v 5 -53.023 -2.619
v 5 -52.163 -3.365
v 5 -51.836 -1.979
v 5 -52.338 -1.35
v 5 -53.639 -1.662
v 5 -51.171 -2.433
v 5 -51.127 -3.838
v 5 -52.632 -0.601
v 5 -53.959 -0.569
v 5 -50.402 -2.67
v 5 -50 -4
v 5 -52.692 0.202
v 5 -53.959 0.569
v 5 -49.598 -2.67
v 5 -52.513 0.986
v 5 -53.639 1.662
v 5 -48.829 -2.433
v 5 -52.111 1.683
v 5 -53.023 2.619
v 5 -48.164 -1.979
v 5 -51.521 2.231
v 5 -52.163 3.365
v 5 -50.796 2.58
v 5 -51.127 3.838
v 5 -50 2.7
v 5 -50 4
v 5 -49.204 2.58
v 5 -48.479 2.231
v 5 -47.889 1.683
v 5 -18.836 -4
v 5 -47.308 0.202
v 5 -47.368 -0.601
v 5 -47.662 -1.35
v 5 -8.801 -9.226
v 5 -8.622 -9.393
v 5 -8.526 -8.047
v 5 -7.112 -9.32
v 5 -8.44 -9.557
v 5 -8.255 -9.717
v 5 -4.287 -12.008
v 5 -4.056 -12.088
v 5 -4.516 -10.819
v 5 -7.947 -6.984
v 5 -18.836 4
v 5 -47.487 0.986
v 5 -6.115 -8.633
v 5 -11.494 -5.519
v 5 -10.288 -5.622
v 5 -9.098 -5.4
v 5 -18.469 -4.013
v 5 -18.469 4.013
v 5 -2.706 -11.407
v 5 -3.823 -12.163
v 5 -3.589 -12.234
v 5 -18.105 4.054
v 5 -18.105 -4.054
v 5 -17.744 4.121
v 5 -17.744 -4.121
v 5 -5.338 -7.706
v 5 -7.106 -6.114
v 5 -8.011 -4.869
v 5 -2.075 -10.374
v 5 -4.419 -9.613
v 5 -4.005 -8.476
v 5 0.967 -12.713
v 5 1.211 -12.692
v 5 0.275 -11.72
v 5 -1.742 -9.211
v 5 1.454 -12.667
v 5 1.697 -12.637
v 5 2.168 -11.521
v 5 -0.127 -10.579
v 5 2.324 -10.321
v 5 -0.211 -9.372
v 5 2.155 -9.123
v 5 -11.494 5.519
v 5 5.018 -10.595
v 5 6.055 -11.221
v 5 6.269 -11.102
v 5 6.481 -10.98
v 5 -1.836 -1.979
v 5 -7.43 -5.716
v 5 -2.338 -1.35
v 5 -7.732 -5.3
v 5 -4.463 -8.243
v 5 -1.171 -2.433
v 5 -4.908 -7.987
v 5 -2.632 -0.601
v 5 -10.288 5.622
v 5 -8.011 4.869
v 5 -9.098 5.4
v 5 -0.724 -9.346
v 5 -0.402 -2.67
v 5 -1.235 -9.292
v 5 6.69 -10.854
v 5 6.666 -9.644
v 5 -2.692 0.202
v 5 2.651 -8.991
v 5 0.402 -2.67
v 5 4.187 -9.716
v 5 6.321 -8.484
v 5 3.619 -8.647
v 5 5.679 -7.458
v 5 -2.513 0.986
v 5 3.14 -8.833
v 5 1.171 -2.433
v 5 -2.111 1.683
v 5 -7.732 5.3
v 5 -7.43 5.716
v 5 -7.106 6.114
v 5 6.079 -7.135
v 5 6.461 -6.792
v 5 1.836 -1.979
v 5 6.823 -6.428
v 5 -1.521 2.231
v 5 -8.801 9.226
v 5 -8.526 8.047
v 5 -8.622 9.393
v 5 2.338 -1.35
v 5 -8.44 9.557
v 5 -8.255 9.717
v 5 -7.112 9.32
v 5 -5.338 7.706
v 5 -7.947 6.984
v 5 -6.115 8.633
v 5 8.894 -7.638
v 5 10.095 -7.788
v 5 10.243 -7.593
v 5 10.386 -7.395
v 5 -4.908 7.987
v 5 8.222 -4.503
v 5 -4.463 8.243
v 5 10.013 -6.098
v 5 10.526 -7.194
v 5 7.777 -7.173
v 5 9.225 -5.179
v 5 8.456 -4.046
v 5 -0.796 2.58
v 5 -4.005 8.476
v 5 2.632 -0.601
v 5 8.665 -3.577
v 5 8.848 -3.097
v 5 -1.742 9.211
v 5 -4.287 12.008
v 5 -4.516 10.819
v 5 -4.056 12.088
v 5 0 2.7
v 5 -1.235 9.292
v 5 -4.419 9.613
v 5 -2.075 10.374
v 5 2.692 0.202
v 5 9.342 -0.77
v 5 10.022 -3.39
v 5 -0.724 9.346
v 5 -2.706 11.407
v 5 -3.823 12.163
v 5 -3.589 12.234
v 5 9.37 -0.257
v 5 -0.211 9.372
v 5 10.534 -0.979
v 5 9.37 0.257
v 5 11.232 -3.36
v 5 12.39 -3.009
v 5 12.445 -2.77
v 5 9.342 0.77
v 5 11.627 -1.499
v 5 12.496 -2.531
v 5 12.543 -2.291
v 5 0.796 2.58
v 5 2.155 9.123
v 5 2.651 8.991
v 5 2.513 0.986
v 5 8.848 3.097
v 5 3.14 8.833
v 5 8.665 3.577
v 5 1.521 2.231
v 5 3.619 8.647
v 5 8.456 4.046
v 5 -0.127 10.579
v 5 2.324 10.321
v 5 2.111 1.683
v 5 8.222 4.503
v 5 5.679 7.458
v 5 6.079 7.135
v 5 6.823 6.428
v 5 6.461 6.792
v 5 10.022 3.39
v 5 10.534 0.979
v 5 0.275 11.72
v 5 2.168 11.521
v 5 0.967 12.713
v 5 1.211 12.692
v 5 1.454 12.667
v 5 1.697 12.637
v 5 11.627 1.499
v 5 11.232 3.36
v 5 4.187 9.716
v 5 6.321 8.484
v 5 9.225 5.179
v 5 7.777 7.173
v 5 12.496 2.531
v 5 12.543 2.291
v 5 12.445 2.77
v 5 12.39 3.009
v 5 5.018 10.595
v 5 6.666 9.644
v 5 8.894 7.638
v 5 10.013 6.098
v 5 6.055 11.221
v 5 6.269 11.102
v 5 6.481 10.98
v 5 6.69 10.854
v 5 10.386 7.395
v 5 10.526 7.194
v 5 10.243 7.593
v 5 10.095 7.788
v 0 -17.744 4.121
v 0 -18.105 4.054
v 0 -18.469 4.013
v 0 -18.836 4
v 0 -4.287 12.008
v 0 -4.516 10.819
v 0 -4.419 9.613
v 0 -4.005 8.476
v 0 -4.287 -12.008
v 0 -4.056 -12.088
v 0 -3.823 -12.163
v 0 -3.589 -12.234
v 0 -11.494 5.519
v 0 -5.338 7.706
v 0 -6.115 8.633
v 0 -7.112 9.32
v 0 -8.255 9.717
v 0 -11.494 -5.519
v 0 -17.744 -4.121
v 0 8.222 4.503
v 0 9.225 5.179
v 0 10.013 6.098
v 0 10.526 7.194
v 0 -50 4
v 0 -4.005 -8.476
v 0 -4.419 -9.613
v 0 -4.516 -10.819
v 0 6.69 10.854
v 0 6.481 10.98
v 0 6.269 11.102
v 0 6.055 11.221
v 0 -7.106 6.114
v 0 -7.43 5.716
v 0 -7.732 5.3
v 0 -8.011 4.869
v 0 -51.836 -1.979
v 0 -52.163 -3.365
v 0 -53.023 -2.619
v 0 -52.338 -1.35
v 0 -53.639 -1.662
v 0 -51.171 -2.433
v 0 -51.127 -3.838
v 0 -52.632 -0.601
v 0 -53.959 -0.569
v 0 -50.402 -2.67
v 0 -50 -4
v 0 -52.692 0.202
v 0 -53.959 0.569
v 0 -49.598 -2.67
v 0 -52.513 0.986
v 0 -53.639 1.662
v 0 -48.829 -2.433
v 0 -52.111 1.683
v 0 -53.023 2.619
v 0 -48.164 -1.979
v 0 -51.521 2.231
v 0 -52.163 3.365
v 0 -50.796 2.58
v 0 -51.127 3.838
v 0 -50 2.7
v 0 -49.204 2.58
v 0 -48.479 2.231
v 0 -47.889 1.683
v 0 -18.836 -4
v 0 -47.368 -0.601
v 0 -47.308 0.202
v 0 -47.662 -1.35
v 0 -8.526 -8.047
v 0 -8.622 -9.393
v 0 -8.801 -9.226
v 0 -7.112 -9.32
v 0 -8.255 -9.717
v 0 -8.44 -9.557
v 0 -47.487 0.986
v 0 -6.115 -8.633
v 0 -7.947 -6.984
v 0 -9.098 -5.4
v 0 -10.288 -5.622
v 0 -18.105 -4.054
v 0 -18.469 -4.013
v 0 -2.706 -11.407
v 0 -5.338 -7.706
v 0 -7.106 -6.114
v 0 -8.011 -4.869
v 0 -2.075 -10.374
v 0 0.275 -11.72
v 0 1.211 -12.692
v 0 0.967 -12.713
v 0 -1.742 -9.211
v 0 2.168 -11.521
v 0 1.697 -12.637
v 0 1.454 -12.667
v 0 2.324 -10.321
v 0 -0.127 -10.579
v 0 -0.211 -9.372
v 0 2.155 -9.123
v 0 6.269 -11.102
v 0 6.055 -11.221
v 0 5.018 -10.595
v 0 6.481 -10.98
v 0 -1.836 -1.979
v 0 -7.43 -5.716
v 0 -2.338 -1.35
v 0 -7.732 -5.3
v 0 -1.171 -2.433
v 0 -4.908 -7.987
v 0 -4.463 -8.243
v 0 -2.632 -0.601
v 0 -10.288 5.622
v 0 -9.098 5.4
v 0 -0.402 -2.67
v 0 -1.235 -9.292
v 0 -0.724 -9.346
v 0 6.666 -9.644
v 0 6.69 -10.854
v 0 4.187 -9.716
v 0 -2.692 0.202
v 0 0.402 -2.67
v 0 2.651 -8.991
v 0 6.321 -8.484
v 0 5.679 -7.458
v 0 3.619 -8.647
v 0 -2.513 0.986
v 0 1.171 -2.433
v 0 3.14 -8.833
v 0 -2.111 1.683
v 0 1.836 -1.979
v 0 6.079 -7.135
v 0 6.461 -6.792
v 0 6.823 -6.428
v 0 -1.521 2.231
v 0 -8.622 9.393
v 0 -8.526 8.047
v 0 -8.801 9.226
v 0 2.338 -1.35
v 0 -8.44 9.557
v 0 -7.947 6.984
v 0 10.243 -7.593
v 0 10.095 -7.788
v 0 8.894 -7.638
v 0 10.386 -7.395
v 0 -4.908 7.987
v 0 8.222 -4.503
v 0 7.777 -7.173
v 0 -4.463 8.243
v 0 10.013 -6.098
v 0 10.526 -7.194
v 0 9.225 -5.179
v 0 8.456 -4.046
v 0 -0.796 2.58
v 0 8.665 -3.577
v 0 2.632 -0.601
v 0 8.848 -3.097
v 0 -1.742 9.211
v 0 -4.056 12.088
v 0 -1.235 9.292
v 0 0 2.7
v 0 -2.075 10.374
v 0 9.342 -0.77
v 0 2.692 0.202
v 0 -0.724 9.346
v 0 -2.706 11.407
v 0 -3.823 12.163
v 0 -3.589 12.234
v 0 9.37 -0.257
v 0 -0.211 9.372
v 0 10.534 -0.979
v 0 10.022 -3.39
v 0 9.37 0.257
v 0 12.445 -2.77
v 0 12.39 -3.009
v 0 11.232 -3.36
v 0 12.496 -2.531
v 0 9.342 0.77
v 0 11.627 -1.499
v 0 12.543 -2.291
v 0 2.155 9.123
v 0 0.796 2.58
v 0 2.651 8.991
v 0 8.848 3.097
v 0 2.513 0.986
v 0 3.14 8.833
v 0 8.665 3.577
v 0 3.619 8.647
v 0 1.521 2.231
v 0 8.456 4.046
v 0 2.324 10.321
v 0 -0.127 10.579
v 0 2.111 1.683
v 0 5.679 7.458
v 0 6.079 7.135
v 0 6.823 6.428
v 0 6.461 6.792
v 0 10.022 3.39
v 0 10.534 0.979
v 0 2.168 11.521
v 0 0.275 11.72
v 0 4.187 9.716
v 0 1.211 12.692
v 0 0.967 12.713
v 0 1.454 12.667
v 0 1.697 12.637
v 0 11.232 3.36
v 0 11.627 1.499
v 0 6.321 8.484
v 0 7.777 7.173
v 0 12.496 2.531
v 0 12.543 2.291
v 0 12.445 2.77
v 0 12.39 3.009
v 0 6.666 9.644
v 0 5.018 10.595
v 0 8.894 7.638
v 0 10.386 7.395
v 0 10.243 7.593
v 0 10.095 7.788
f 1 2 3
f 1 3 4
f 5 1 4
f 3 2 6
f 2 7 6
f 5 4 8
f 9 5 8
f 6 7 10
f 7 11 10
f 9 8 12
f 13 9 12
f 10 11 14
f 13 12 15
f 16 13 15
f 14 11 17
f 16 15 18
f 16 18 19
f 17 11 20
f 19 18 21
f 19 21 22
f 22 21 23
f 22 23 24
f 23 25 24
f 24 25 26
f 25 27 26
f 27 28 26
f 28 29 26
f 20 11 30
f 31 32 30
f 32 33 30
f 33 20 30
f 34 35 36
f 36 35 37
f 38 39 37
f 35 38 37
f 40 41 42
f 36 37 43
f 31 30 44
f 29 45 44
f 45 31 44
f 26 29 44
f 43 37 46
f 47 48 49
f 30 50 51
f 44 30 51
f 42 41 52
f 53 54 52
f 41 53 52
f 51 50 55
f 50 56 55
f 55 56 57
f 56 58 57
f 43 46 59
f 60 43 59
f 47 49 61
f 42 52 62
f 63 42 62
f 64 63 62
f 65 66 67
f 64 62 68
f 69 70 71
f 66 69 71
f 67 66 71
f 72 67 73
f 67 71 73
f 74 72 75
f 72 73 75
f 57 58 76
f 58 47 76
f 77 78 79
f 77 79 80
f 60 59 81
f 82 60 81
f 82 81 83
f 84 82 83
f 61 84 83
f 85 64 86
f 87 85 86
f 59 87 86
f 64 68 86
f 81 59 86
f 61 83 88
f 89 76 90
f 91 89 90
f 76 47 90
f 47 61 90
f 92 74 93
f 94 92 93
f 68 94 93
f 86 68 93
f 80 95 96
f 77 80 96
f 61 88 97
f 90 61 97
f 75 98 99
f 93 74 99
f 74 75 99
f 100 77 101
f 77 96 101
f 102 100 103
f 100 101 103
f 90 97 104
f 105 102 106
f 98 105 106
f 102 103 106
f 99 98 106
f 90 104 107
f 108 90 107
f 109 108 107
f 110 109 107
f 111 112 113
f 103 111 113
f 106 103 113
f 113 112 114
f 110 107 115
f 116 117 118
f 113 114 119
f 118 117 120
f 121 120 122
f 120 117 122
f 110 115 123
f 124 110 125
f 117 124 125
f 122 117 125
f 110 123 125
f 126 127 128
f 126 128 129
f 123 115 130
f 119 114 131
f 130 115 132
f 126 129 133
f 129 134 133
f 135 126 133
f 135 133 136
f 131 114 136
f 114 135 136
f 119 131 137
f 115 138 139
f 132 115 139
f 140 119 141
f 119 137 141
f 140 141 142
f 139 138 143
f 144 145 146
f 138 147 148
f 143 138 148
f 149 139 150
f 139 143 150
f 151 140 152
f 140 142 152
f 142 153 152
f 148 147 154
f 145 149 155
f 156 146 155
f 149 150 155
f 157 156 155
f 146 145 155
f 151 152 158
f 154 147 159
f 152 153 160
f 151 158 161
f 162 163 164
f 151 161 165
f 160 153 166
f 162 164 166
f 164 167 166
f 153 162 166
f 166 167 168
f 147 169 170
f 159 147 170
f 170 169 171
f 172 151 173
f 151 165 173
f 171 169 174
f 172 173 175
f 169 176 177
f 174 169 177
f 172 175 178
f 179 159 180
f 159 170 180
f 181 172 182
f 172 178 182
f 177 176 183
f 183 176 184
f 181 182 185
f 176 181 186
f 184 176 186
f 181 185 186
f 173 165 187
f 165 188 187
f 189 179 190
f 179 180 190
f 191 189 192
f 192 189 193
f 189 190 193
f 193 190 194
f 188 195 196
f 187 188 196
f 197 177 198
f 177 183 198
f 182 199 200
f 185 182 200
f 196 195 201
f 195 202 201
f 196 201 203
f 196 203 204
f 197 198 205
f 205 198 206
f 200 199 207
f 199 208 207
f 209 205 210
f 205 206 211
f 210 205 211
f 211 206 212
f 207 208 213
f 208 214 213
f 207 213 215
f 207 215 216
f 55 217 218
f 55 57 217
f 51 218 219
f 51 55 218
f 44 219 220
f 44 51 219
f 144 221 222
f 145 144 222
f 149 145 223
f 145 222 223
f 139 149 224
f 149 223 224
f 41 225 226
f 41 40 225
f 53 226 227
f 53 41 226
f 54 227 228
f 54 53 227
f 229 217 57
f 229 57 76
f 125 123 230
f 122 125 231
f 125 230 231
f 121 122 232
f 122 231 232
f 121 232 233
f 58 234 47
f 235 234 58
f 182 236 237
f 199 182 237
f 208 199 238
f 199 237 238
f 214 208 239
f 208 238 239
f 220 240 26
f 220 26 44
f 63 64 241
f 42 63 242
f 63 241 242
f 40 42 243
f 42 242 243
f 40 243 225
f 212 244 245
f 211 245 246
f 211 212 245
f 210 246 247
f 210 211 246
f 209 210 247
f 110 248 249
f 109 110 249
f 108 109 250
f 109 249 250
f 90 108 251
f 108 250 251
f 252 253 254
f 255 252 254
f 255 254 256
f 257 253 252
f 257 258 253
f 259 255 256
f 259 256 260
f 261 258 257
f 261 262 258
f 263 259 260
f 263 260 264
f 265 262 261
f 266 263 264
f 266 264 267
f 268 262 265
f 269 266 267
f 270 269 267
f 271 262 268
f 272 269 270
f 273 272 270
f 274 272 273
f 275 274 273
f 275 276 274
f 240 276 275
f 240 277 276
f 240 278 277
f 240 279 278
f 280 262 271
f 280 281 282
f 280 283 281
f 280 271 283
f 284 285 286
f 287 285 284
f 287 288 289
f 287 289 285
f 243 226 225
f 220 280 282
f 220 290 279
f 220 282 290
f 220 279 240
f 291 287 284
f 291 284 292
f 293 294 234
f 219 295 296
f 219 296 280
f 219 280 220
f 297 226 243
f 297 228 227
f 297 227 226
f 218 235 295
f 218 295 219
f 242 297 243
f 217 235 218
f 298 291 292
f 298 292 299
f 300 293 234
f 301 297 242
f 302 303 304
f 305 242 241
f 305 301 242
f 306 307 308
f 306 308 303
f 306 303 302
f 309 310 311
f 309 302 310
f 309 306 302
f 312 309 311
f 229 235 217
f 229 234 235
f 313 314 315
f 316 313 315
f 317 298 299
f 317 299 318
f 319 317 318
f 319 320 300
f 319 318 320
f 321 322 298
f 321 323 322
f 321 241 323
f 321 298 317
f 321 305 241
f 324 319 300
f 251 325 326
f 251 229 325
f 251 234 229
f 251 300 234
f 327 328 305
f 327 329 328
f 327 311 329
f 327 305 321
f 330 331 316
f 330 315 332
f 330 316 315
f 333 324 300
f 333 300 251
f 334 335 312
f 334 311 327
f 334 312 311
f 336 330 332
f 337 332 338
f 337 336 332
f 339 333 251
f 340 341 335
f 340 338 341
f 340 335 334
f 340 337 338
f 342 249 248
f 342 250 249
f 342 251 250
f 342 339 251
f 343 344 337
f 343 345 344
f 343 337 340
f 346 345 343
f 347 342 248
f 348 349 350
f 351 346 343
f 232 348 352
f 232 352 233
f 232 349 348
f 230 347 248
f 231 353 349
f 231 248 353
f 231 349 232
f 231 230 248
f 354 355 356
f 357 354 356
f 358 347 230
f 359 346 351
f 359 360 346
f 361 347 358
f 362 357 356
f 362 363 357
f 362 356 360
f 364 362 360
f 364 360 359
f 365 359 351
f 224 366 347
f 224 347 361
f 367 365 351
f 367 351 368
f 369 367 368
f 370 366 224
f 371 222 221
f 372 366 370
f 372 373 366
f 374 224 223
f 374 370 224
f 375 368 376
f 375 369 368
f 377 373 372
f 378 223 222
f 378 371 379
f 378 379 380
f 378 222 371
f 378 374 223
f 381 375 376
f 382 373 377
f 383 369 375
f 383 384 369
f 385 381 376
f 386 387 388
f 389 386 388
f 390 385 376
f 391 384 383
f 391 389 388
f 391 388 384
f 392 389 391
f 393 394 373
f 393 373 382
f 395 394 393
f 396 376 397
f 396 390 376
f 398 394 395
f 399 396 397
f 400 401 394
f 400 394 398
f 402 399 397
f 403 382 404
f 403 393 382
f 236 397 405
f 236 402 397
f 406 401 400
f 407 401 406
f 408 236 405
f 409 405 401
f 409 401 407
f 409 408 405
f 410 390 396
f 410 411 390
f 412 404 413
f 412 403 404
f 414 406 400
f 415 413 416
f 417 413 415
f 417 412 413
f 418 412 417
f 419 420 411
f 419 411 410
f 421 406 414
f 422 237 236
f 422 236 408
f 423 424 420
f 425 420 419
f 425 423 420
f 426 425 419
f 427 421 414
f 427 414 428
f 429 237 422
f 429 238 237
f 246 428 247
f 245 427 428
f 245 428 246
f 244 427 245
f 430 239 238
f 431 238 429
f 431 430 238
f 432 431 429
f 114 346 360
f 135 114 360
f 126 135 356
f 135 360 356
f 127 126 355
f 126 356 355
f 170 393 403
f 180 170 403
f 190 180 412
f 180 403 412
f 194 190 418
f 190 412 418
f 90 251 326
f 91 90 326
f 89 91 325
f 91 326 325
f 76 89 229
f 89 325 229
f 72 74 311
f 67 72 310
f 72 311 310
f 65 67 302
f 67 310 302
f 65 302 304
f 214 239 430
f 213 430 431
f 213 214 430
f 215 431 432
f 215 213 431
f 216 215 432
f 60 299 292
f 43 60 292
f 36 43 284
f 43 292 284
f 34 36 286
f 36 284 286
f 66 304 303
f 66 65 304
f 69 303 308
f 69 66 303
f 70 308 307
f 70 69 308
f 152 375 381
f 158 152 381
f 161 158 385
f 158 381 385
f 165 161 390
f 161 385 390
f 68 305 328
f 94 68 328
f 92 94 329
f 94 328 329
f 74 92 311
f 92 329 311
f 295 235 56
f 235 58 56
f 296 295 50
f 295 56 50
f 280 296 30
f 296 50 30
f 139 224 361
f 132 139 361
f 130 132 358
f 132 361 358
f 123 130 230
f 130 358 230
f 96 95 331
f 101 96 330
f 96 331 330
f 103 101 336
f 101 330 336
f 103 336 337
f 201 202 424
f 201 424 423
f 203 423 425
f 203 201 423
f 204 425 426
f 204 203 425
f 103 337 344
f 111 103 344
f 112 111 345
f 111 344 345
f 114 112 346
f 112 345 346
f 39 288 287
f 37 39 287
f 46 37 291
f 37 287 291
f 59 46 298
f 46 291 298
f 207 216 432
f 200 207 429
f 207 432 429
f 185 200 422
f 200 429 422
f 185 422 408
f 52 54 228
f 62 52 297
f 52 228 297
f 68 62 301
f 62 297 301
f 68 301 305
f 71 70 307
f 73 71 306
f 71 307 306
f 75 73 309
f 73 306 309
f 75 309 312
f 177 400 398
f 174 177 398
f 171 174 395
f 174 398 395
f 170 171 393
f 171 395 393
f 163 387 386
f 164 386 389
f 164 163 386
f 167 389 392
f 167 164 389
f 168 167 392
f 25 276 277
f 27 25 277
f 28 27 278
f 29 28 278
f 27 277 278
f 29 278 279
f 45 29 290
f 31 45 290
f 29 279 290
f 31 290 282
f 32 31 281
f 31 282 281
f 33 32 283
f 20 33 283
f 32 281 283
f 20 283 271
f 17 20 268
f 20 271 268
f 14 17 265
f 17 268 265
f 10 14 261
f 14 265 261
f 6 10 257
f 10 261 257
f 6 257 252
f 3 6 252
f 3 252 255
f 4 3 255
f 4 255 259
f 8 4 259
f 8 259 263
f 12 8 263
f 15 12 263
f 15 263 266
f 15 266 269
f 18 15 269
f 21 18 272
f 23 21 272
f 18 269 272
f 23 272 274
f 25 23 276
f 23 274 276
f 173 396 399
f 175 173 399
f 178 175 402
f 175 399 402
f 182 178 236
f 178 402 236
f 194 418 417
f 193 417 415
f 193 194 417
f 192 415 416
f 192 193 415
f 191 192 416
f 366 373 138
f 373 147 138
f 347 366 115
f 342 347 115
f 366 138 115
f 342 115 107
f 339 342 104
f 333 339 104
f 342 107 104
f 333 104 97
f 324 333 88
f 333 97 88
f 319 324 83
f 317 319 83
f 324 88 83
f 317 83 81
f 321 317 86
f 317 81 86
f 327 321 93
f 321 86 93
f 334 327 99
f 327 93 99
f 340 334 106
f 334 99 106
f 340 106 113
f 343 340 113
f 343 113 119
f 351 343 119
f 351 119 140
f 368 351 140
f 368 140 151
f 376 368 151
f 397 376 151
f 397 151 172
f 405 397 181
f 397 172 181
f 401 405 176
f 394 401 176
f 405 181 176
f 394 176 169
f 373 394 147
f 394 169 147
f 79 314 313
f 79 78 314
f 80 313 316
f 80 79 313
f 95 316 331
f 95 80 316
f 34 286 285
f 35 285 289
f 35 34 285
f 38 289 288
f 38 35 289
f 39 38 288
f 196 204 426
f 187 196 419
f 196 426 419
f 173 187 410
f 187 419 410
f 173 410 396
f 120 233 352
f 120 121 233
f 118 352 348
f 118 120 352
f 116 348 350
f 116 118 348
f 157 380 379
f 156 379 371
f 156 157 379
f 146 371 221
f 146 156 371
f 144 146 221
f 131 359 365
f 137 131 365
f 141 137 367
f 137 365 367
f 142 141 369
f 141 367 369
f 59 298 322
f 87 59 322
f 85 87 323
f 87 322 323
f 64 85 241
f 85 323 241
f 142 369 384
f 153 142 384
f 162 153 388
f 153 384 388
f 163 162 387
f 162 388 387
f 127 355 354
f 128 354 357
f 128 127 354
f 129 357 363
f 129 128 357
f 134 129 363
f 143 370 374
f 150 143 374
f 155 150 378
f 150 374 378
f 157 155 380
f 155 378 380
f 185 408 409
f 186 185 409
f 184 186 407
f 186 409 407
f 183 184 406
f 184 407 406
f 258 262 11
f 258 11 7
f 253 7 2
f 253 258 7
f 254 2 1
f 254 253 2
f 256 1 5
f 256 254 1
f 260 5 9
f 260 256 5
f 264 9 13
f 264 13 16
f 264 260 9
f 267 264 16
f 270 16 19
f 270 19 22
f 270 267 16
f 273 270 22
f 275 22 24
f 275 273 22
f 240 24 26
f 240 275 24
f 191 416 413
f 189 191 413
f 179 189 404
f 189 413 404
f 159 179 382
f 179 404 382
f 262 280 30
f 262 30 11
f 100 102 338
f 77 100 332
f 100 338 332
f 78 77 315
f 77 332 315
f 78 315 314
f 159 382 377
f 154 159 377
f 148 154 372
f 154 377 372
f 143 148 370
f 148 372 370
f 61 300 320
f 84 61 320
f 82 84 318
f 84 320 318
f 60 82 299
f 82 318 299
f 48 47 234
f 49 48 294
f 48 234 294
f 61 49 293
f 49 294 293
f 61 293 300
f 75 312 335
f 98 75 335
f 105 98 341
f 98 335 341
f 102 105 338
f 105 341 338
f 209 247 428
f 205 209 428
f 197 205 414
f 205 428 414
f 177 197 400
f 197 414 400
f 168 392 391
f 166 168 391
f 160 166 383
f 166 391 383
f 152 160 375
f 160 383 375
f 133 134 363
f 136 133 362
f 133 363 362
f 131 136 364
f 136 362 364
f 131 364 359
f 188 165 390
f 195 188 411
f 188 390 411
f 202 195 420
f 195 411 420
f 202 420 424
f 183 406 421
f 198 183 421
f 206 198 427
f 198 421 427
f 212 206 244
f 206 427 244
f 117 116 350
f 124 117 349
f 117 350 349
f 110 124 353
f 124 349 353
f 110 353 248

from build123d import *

# Parameters (mm, degrees)
BASPROSKE_W         = 5
BASPROSKE_H         = 12.75
TOOTHCUT_DEPTH      = 19.711627401
TEETHCUTS_COUNT     = 15
TEETHCUTS_ANGLE     = 336
BORSKE_R            = 2.7
BORE_DEPTH          = 50.0049784
SKETCH3_R           = 2.7
BOSS_EXTRUDE2_DEPTH = 5
FILLET1_R           = 5


with BuildPart() as part:
    # BasProSke → Base-Revolve (revolve)
    with BuildSketch(Plane(origin=(0, 0, 0), x_dir=(1, 0, 0), z_dir=(0, 1, 0)), mode=Mode.PRIVATE) as base_revolve_sk:
        with Locations((2.5, 6.375)):
            Rectangle(BASPROSKE_W, BASPROSKE_H)
    revolve(base_revolve_sk.sketch.rotate(Axis((-10, 0, 0), (1, 0, 0)), 180), axis=Axis((-10, 0, 0), (1, 0, 0)))

    # TooCutSke → ToothCut (cut, through all)
    with BuildSketch(Plane(origin=(0, 0, 0), x_dir=(0, 0, -1), z_dir=(1, 0, 0))):
        with BuildLine():
            ThreePointArc((0.769645606, 9.34235097), (0, 9.374), (-0.769645606, 9.34235097))
            ThreePointArc((-0.769645606, 9.34235097), (-1.209019537, 11.113083179), (-2.315283452, 12.563849239))
            ThreePointArc((-2.315283452, 12.563849239), (0, 12.7754), (2.315283452, 12.563849239))
            ThreePointArc((2.315283452, 12.563849239), (1.209019537, 11.113083179), (0.769645606, 9.34235097))
        make_face()
    toothcut = extrude(amount=TOOTHCUT_DEPTH, mode=Mode.SUBTRACT)

    # TeethCuts: ToothCut ×15 about axis
    teethcuts_axis = Axis((-10, 0, 0), (1, 0, 0))
    for i in range(1, TEETHCUTS_COUNT):
        add(toothcut.rotate(teethcuts_axis, i * TEETHCUTS_ANGLE / (TEETHCUTS_COUNT - 1)), mode=Mode.SUBTRACT)

    # BorSke → Bore (cut, symmetric)
    with BuildSketch(Plane(origin=(0, 0, 0), x_dir=(0, 0, -1), z_dir=(1, 0, 0))):
        with Locations(Location((0, 0, 0), (0, 0, 180))):
            Circle(BORSKE_R)
    extrude(amount=BORE_DEPTH, both=True, mode=Mode.SUBTRACT)

    # Sketch3 → Boss-Extrude2 (add)
    with BuildSketch(Plane.ZY):
        with BuildLine():
            Line((-5.518933108, -11.493645085), (-4, -18.283482979))
            Line((-4, -18.283482979), (-4, -50))
            ThreePointArc((-4, -50), (0, -54), (4, -50))
            Line((4, -50), (4, -18.283482979))
            Line((4, -18.283482979), (5.518933108, -11.493645085))
            Line((5.518933108, -11.493645085), (2.695210989, -8.978179867))
            Line((2.695210989, -8.978179867), (-2.695210989, -8.978179867))
            Line((-2.695210989, -8.978179867), (-5.518933108, -11.493645085))
        make_face()
        with Locations((0, -50)):
            Circle(SKETCH3_R, mode=Mode.SUBTRACT)
    extrude(amount=-BOSS_EXTRUDE2_DEPTH)

    # Fillet1
    fillet1_edges = [part.edges().sort_by_distance(p)[0] for p in [
        (2.5, -18.283482979, -4),
        (2.5, -18.283482979, 4),
    ]]
    fillet(fillet1_edges, radius=FILLET1_R)


solid = part.part
